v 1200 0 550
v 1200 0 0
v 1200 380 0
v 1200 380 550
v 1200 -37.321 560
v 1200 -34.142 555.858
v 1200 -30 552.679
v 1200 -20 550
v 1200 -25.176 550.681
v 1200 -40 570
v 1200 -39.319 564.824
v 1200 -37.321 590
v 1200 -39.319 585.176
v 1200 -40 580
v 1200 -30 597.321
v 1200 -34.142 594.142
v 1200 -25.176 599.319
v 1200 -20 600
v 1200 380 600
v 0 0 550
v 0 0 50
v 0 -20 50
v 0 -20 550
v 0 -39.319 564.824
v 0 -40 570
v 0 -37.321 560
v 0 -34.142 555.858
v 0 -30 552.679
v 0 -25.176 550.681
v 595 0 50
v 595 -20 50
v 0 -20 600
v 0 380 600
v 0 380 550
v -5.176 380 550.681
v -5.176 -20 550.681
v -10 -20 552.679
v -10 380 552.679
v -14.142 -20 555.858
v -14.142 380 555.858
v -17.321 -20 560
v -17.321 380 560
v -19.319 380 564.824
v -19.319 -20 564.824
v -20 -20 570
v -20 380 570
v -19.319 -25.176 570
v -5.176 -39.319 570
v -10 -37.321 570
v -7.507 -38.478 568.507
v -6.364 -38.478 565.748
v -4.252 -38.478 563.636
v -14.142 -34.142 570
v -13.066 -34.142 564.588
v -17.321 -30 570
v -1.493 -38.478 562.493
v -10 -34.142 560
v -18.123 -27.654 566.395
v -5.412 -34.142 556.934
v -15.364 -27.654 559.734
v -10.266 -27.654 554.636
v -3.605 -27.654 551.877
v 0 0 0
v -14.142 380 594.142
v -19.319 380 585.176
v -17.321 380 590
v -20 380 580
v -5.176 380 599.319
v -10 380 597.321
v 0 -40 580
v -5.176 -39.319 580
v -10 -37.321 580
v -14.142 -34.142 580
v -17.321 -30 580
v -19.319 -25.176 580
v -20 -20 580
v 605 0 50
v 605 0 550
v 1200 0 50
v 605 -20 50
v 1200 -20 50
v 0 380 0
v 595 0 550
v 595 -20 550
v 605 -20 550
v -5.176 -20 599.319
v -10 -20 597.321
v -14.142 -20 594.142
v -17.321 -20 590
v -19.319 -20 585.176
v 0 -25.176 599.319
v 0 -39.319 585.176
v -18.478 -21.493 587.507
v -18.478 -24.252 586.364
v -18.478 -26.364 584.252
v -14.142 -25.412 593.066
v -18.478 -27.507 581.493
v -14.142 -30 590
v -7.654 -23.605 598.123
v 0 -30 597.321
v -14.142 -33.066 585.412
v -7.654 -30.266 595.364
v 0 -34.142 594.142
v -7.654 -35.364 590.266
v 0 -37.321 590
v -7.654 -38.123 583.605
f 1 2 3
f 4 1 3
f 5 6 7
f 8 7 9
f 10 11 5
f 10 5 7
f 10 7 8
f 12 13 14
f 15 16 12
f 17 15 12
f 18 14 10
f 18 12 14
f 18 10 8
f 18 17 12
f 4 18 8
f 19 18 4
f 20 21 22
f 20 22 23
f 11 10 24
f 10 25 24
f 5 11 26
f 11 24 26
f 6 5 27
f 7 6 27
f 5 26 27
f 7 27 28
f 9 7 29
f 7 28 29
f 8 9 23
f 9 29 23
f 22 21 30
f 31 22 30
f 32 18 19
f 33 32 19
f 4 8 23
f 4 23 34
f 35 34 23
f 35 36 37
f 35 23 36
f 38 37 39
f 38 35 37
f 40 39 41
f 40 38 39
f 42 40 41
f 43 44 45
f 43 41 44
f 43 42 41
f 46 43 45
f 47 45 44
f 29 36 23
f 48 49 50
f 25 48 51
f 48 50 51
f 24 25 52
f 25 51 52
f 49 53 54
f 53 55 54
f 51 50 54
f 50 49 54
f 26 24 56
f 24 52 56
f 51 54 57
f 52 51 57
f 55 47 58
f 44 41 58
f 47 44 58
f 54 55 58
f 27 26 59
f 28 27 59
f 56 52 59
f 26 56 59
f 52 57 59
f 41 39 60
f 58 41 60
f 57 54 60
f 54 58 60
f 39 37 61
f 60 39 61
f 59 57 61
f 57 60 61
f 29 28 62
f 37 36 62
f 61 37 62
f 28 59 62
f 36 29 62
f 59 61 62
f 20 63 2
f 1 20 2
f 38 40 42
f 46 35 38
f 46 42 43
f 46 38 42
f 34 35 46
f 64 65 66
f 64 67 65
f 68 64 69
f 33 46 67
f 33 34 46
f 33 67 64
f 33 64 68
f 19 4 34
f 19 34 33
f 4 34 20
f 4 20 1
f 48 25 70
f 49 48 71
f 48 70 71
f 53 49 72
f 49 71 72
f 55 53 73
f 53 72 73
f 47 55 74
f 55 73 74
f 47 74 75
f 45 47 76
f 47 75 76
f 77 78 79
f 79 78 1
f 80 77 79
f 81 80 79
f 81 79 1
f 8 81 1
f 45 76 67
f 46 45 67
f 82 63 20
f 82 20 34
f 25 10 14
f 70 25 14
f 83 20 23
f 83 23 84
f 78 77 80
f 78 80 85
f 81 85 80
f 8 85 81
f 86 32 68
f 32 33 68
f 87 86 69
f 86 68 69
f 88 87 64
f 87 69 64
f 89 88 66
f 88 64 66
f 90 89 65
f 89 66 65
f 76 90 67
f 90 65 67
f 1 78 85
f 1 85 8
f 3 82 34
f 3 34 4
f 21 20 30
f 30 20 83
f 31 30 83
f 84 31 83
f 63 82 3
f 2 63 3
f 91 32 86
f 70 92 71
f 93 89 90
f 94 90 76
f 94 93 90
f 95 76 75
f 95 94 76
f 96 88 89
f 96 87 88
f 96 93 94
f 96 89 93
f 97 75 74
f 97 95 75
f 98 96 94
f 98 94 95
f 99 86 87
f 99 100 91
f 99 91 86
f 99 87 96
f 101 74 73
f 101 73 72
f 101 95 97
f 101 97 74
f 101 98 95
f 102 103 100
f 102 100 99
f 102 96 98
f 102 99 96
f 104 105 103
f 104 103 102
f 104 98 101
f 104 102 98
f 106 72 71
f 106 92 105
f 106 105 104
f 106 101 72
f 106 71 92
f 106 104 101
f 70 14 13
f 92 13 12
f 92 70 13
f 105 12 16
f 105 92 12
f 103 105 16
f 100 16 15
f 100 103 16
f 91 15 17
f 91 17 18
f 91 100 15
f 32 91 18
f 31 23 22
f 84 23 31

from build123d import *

# Parameters (mm, degrees)
F1_W     = 1200
F1_H     = 380
F2_DEPTH = 550
F3_W     = 595
F3_H     = 500
F4_DEPTH = 20
F5_W     = 420
F5_H     = 50
F6_DEPTH = 1220
F7_R     = 20


with BuildPart() as f2:
    # F1 (on Top) → F2 (new body)
    with BuildSketch(Plane.XY):
        with Locations((600, 190)):
            Rectangle(F1_W, F1_H)
    extrude(amount=F2_DEPTH)


with BuildPart() as f4:
    # F3 (on face) → F4 (new body)
    with BuildSketch(Plane.XZ):
        with Locations((297.5, 300)):
            Rectangle(F3_W, F3_H)
    extrude(amount=F4_DEPTH)


with BuildPart() as f4b:
    # F3 (on face) → F4, piece 2 (new body)
    with BuildSketch(Plane.XZ):
        with Locations((902.5, 300)):
            Rectangle(F3_W, F3_H)
    extrude(amount=F4_DEPTH)


with BuildPart() as f6:
    # F5 (on face) → F6 (new body, through all)
    with BuildSketch(Plane.YZ.offset(1200)):
        with Locations((170, 575)):
            Rectangle(F5_W, F5_H)
    extrude(amount=-F6_DEPTH)

    # F7
    f7_edges = [f6.edges().sort_by_distance(p)[0] for p in [
        (590, -40, 600),
        (-20, 170, 600),
        (-20, 170, 550),
        (-20, -40, 575),
        (590, -40, 550),
    ]]
    fillet(f7_edges, radius=F7_R)


solid = Compound([f2.part, f4.part, f4b.part, f6.part])
